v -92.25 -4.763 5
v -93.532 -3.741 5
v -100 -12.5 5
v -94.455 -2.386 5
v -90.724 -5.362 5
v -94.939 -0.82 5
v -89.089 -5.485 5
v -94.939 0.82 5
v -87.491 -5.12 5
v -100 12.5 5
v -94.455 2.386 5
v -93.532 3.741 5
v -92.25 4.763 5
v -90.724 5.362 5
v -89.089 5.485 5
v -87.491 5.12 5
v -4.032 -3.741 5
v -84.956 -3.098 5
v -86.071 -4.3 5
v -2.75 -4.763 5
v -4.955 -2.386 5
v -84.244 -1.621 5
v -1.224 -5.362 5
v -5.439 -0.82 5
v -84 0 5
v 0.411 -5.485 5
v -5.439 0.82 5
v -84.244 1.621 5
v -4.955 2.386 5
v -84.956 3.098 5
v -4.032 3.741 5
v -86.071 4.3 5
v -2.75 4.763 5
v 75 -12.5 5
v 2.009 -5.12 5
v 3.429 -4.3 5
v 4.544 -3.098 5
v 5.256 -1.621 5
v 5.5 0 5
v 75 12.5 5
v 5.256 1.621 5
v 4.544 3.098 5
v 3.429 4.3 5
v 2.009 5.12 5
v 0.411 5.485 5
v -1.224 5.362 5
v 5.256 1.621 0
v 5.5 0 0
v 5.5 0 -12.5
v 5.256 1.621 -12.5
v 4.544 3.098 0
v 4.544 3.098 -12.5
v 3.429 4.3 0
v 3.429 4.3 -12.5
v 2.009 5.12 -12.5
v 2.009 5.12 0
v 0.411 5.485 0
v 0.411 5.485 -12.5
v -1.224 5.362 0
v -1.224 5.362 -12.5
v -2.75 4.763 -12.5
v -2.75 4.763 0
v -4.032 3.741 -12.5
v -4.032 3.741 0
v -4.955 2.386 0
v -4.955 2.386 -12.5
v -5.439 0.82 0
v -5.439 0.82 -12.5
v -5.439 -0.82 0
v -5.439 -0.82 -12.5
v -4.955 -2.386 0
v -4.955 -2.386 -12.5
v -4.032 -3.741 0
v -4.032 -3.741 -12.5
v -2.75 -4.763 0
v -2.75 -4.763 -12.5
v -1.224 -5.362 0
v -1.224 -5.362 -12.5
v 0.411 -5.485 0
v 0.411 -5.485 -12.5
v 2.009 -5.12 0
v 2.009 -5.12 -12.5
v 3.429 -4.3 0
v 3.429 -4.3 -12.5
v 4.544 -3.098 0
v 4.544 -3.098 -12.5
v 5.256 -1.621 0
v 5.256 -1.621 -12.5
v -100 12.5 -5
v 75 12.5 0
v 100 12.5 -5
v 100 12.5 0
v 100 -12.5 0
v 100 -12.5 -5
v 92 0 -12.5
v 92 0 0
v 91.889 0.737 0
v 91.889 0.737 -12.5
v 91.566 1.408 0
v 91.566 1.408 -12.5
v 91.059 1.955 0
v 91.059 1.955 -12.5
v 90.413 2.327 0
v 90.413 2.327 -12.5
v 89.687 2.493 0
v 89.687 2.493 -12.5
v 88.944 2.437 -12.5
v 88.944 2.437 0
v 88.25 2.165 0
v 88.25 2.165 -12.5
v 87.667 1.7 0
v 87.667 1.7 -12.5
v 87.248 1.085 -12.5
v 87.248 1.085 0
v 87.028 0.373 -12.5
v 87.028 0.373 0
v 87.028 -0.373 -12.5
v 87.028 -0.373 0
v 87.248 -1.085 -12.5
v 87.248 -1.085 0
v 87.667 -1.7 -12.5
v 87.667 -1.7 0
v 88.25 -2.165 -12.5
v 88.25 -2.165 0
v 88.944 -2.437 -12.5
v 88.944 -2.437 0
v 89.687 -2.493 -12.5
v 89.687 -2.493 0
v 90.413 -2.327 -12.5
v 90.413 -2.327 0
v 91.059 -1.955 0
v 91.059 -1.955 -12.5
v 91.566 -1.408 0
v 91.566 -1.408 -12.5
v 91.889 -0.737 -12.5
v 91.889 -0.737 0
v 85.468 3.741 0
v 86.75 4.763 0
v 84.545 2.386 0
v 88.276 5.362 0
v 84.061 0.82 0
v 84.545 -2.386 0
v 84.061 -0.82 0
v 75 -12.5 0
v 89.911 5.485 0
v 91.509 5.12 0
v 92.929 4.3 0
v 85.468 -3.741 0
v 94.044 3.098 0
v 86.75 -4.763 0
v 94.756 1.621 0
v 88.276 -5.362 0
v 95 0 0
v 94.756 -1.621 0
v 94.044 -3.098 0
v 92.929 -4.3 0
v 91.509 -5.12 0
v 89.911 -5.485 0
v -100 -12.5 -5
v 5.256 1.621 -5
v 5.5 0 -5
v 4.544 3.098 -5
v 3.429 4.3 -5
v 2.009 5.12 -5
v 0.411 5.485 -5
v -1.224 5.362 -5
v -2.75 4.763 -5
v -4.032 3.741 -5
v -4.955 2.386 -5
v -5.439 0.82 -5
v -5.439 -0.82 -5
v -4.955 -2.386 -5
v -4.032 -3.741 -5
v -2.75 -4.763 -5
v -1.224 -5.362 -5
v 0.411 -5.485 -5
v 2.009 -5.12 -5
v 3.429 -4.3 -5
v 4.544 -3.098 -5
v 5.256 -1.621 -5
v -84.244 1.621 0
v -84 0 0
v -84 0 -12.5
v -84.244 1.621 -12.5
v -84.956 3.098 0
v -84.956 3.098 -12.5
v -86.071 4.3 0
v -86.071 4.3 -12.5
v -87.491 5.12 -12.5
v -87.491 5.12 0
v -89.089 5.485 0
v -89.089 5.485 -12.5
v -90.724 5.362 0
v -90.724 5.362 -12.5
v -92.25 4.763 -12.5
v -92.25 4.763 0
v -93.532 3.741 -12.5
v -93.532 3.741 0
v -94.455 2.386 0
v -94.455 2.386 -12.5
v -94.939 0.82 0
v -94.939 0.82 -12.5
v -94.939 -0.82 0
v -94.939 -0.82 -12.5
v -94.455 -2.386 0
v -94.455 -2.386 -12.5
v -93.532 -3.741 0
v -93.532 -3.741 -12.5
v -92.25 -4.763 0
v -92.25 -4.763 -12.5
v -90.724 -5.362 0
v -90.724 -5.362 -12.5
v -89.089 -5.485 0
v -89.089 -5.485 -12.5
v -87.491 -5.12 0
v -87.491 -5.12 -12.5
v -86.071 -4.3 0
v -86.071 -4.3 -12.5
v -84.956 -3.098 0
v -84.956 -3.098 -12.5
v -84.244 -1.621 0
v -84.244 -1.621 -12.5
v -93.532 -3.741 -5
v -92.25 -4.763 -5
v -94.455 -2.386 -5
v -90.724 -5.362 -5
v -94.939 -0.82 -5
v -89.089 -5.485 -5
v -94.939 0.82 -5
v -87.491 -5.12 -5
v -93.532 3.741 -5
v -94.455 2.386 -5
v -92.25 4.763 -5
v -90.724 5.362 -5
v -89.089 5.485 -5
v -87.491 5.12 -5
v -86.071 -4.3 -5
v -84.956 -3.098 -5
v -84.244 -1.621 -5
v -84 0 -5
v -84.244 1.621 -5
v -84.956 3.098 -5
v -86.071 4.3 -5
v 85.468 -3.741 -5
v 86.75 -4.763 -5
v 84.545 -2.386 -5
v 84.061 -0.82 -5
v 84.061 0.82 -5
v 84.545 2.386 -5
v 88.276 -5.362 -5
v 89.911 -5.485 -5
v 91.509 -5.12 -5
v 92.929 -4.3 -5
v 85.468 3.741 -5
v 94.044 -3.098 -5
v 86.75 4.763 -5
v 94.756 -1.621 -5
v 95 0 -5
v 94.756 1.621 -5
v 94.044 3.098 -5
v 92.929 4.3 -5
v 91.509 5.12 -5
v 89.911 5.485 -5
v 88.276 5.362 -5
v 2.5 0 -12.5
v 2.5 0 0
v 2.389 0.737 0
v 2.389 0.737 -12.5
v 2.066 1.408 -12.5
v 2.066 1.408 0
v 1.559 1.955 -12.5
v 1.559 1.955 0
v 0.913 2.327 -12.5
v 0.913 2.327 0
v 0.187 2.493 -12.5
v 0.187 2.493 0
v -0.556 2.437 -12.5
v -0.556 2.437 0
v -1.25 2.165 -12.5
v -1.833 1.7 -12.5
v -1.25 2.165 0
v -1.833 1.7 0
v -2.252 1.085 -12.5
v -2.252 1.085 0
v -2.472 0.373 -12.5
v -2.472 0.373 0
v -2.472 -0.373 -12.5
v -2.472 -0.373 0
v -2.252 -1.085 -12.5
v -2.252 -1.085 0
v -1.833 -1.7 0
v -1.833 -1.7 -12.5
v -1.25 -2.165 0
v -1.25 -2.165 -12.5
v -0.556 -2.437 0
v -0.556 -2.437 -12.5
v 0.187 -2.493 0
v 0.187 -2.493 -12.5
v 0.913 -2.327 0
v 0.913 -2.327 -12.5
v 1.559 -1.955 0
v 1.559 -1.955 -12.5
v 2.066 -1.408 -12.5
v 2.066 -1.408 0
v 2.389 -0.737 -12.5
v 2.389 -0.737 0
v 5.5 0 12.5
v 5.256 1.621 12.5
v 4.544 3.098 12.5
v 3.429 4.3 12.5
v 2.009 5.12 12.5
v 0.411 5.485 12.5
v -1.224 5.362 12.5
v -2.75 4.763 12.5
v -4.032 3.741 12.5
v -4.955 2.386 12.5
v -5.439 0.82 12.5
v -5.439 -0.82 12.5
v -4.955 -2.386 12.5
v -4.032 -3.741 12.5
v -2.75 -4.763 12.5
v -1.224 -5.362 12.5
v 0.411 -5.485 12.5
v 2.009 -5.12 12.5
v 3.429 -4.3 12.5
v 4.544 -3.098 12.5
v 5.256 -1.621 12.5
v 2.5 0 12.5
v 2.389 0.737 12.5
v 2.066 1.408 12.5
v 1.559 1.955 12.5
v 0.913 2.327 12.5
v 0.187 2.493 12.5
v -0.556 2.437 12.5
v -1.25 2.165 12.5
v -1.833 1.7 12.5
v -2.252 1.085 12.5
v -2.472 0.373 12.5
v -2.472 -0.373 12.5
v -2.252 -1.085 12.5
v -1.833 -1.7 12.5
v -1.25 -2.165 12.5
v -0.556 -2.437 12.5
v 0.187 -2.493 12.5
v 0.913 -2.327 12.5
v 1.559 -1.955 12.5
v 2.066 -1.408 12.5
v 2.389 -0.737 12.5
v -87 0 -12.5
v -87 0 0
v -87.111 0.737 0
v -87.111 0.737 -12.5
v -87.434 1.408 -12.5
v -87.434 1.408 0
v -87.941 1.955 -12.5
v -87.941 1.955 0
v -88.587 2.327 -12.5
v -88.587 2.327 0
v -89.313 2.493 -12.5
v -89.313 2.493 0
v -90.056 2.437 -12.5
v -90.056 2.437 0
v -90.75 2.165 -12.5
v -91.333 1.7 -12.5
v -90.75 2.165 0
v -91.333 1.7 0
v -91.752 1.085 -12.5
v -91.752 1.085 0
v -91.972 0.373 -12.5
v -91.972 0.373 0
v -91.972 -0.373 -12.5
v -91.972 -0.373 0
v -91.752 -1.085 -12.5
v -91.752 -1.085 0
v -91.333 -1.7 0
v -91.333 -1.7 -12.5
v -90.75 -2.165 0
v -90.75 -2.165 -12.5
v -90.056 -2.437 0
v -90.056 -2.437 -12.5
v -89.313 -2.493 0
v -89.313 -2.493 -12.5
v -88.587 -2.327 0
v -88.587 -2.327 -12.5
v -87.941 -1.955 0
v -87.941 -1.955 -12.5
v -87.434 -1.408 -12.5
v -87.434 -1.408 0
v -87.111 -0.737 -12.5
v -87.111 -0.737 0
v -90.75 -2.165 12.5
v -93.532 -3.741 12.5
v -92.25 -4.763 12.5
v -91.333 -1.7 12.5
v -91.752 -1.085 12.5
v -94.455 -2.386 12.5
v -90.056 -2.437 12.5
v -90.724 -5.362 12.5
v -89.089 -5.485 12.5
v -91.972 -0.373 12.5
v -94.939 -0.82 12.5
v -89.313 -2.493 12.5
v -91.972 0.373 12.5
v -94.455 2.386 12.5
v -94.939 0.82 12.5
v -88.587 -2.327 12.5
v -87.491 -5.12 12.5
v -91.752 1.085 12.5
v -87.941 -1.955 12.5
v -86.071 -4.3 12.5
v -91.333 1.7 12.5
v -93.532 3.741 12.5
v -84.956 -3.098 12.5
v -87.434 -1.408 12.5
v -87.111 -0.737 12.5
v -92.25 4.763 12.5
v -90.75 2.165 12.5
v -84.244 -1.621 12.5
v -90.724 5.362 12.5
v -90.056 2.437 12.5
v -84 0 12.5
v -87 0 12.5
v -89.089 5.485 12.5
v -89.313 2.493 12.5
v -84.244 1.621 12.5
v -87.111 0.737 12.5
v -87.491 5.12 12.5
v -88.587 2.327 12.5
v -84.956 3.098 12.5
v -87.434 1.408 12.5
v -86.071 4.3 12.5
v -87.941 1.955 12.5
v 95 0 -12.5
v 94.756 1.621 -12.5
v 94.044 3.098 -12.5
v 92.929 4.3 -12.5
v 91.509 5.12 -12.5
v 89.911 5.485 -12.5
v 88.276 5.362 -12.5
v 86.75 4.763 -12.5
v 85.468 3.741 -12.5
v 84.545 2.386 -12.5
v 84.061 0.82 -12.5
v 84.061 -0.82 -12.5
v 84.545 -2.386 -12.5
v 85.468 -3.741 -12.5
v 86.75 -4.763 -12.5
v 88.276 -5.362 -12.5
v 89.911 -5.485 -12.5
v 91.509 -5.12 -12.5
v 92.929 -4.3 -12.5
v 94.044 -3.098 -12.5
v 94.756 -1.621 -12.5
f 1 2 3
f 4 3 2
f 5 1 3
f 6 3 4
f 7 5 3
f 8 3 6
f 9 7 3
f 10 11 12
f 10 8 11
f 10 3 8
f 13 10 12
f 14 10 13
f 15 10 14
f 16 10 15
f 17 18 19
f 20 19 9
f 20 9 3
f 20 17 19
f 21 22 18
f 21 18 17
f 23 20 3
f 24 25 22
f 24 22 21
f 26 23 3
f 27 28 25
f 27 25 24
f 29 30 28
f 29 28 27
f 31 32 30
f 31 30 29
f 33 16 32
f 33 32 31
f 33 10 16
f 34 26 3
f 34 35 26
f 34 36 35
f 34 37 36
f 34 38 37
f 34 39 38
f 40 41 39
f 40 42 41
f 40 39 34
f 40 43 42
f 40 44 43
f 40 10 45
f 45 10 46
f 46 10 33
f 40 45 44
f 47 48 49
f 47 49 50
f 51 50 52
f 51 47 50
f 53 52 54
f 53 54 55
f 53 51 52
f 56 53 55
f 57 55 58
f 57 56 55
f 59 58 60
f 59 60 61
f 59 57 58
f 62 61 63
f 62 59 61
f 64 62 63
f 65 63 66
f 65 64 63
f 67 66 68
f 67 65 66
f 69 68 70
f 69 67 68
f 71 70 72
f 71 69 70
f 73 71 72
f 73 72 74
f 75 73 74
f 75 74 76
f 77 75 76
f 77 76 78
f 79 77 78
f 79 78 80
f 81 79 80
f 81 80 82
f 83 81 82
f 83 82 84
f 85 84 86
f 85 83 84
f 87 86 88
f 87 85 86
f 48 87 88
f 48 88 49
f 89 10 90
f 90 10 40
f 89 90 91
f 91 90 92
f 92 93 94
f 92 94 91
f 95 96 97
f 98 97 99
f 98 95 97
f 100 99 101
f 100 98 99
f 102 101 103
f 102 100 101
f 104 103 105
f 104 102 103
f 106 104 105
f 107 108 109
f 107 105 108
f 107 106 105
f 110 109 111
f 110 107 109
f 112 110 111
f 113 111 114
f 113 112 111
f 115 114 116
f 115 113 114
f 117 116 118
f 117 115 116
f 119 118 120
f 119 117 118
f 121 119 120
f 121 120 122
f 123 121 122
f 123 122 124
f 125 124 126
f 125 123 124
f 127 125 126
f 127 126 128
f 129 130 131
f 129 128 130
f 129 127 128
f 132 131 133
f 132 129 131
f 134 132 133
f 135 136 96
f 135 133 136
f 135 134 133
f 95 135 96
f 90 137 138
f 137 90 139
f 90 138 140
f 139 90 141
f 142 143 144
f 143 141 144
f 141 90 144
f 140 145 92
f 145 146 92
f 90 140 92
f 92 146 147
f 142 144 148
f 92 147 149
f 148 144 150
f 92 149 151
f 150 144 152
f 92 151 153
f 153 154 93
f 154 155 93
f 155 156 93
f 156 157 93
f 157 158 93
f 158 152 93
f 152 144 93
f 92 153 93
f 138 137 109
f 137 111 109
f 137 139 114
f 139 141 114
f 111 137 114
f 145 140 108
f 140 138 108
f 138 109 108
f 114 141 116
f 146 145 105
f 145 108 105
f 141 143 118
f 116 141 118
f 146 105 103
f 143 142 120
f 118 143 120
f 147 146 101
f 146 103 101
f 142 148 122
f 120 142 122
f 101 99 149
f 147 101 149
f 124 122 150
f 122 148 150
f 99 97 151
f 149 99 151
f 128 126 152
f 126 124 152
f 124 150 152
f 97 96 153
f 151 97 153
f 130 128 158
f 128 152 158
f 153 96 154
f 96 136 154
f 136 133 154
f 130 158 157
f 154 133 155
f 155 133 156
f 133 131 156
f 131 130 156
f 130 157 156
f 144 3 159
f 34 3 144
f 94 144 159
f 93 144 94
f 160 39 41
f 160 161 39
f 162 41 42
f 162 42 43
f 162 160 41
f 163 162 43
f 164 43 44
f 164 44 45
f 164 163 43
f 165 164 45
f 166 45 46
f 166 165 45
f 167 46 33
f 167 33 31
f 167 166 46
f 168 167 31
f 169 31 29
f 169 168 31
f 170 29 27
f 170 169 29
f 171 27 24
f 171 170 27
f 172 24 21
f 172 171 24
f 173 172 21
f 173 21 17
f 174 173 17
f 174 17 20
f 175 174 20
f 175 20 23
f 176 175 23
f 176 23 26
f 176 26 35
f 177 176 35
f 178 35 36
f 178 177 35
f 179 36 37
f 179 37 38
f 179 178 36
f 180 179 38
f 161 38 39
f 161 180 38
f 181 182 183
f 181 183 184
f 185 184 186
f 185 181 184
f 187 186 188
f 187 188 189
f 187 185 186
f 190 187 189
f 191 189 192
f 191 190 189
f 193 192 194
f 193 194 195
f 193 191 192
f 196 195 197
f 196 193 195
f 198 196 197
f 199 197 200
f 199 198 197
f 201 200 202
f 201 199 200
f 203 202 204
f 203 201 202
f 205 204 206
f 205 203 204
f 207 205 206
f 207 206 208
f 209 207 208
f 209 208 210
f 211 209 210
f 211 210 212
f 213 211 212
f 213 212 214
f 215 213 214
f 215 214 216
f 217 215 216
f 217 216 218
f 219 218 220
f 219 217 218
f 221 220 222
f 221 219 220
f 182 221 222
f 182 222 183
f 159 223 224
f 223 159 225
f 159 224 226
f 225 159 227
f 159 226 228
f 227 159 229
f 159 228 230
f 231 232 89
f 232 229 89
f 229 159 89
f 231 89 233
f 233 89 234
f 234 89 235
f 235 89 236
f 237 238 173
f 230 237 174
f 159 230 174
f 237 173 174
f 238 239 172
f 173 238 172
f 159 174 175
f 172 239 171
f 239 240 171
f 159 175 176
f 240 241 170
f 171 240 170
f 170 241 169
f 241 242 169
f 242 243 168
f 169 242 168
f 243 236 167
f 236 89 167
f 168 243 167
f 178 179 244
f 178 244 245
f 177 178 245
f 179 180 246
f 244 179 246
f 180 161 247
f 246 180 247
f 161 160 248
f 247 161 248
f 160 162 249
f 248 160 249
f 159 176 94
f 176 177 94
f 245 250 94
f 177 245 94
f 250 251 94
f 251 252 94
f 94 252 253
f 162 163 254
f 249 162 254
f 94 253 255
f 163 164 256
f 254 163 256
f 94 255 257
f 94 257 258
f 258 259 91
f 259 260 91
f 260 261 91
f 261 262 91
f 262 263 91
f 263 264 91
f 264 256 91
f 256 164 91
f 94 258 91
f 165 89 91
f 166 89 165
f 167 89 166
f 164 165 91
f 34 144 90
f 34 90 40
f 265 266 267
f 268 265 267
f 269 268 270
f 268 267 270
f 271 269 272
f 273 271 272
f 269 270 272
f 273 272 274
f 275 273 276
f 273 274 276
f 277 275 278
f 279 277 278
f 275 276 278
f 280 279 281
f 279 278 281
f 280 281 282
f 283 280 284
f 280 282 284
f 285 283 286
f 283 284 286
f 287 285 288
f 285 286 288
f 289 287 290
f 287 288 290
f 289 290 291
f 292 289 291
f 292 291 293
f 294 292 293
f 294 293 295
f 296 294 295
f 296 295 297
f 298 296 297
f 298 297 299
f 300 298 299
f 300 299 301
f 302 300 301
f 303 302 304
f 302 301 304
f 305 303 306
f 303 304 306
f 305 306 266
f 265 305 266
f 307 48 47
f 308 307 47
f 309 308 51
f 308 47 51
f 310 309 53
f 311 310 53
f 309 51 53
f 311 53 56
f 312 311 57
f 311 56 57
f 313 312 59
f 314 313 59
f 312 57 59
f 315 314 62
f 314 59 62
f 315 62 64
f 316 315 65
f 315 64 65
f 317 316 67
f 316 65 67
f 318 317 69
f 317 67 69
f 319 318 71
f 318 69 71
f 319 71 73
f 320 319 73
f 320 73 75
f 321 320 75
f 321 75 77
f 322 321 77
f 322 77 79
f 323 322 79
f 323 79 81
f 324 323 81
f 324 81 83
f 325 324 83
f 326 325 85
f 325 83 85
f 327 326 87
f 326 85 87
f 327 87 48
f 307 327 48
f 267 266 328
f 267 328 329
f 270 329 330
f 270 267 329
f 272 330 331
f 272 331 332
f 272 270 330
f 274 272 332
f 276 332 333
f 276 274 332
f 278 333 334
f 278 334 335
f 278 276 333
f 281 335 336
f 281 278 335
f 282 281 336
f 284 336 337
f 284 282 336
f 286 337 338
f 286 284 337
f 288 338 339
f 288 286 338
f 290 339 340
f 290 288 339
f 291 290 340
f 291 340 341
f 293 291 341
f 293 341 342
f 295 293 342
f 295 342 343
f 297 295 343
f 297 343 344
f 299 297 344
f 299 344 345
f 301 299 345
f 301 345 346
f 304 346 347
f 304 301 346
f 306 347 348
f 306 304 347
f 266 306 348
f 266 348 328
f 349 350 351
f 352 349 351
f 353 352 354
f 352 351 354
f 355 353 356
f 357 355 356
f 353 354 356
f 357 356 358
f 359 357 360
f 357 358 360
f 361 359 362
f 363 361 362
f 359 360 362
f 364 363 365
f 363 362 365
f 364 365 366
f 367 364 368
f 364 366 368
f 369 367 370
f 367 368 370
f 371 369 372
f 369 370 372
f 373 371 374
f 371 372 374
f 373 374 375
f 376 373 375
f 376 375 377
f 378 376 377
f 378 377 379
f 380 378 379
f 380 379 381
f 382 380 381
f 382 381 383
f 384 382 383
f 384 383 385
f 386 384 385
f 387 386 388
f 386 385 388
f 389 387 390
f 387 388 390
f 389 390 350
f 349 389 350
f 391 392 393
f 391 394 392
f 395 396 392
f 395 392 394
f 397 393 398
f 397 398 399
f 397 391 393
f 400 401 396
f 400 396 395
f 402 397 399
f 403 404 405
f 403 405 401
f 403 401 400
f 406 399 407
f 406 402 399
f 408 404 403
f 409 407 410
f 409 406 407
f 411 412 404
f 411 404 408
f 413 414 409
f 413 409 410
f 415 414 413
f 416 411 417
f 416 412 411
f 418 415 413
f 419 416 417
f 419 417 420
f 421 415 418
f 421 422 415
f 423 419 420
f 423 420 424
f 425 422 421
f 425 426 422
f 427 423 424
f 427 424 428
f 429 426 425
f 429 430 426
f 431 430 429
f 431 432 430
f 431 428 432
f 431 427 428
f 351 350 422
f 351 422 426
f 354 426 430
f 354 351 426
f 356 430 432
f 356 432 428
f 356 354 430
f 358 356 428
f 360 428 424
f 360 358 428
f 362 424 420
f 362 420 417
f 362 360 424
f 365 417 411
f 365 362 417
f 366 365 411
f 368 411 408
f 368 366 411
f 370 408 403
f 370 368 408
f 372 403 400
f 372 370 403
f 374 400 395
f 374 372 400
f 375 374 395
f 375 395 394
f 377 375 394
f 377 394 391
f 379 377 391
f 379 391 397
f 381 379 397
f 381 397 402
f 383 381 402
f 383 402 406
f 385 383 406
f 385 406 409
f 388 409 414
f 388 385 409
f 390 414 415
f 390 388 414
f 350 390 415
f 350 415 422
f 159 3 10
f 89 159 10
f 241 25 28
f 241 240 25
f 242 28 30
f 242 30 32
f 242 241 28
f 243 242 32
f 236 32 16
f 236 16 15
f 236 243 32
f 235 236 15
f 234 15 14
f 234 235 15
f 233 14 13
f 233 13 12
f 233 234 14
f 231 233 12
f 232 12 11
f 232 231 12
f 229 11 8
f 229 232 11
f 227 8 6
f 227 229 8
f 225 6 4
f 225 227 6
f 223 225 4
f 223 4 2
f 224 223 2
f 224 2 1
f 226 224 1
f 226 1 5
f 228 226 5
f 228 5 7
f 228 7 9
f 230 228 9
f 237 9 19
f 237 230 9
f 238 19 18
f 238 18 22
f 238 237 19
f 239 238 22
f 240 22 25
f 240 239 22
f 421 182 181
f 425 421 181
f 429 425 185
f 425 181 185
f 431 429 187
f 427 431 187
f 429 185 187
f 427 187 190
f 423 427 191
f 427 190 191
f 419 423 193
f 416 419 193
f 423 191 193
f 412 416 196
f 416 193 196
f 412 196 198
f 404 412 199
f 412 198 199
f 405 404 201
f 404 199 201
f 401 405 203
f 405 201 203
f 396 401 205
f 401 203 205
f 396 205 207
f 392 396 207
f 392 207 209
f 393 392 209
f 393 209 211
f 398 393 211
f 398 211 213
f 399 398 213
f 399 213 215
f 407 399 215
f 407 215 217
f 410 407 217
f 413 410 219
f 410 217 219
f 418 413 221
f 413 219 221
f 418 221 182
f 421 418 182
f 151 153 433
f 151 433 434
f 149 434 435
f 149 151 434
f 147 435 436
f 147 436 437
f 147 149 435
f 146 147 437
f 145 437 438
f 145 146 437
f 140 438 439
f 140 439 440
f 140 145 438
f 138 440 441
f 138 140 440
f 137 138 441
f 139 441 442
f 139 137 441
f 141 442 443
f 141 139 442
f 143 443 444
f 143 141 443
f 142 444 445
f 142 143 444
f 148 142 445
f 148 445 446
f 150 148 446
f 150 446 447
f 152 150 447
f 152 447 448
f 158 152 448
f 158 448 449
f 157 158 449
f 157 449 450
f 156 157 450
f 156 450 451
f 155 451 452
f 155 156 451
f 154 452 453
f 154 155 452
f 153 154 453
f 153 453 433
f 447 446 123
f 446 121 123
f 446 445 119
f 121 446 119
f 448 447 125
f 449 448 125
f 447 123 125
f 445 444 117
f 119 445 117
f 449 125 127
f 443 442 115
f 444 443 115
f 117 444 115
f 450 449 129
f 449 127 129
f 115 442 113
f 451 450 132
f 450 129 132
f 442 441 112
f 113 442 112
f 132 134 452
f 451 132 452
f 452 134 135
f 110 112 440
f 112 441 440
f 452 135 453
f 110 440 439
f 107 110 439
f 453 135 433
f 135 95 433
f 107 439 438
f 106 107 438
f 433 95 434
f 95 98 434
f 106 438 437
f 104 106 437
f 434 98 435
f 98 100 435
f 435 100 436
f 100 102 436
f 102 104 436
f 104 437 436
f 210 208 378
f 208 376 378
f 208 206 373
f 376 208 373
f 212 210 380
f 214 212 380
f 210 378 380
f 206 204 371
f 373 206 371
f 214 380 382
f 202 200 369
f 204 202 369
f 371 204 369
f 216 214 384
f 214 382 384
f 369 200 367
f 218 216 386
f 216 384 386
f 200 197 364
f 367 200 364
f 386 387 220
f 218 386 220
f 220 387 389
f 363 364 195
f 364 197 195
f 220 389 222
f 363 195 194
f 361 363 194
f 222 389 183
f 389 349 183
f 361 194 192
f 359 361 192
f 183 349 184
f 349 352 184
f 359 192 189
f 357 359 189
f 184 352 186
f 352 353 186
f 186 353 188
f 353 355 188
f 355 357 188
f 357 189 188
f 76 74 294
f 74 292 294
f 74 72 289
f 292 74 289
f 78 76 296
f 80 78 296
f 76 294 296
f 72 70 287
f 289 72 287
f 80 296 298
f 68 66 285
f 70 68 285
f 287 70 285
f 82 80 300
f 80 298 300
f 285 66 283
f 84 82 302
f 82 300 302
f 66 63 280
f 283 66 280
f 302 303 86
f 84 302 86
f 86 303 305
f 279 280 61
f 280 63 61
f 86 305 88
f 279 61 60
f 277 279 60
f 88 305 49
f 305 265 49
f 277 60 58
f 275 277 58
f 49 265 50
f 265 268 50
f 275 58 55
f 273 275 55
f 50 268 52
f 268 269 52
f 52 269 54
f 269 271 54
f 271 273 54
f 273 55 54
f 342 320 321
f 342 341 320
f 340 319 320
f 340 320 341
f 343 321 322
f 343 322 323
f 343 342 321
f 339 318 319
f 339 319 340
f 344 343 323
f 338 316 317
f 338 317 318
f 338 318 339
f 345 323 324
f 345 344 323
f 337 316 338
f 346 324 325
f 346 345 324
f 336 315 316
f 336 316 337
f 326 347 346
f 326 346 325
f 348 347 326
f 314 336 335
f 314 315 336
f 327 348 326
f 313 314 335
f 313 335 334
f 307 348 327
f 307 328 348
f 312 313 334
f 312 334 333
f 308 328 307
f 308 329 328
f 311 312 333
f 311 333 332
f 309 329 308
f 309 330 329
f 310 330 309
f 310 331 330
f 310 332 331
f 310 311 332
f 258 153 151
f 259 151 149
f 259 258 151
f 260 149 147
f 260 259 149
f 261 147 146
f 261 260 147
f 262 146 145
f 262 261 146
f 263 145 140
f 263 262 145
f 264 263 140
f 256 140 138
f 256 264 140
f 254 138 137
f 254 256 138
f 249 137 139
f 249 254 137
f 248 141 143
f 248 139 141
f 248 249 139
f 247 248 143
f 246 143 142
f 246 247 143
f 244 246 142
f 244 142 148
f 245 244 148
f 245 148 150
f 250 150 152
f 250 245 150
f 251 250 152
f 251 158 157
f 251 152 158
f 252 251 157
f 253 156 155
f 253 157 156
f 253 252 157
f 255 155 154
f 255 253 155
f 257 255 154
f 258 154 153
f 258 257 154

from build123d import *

# Parameters (mm, degrees)
F0_R     = 5.5
F0_R_2   = 2.5
F1_DEPTH = 12.5
F0_W     = 200
F0_H     = 25
F2_DEPTH = 5
F3_W     = 30
F3_H     = 20
F4_DEPTH = 15


with BuildPart() as f1:
    # F0 (on Top) → F1 (new body, symmetric)
    with BuildSketch(Plane.XY):
        with Locations((-89.5, 0)):
            Circle(F0_R)
        with Locations((-89.5, 0)):
            Circle(F0_R_2, mode=Mode.SUBTRACT)
        Circle(F0_R)
        Circle(F0_R_2, mode=Mode.SUBTRACT)
        with Locations((89.5, 0)):
            Circle(F0_R)
        with Locations((89.5, 0)):
            Circle(F0_R_2, mode=Mode.SUBTRACT)
    extrude(amount=F1_DEPTH, both=True)


with BuildPart() as f2:
    # F0 (on Top) → F2 (new body, symmetric)
    with BuildSketch(Plane.XY):
        Rectangle(F0_W, F0_H)
        with Locations((-89.5, 0)):
            Circle(F0_R, mode=Mode.SUBTRACT)
        Circle(F0_R, mode=Mode.SUBTRACT)
        with Locations((89.5, 0)):
            Circle(F0_R, mode=Mode.SUBTRACT)
    extrude(amount=F2_DEPTH, both=True)


with BuildPart() as f4_tool:
    # F3 (on Front) → F4 (new body, symmetric)
    with BuildSketch(Plane.XZ):
        with Locations((90, 10)):
            Rectangle(F3_W, F3_H)
    extrude(amount=F4_DEPTH, both=True)


with BuildPart() as f1_1:
    add(f1.part)

    # F4: cut by f4_tool
    add(f4_tool.part, mode=Mode.SUBTRACT)


with BuildPart() as f2_1:
    add(f2.part)

    # F4: cut by f4_tool
    add(f4_tool.part, mode=Mode.SUBTRACT)


solid = Compound([f1_1.part, f2_1.part])
